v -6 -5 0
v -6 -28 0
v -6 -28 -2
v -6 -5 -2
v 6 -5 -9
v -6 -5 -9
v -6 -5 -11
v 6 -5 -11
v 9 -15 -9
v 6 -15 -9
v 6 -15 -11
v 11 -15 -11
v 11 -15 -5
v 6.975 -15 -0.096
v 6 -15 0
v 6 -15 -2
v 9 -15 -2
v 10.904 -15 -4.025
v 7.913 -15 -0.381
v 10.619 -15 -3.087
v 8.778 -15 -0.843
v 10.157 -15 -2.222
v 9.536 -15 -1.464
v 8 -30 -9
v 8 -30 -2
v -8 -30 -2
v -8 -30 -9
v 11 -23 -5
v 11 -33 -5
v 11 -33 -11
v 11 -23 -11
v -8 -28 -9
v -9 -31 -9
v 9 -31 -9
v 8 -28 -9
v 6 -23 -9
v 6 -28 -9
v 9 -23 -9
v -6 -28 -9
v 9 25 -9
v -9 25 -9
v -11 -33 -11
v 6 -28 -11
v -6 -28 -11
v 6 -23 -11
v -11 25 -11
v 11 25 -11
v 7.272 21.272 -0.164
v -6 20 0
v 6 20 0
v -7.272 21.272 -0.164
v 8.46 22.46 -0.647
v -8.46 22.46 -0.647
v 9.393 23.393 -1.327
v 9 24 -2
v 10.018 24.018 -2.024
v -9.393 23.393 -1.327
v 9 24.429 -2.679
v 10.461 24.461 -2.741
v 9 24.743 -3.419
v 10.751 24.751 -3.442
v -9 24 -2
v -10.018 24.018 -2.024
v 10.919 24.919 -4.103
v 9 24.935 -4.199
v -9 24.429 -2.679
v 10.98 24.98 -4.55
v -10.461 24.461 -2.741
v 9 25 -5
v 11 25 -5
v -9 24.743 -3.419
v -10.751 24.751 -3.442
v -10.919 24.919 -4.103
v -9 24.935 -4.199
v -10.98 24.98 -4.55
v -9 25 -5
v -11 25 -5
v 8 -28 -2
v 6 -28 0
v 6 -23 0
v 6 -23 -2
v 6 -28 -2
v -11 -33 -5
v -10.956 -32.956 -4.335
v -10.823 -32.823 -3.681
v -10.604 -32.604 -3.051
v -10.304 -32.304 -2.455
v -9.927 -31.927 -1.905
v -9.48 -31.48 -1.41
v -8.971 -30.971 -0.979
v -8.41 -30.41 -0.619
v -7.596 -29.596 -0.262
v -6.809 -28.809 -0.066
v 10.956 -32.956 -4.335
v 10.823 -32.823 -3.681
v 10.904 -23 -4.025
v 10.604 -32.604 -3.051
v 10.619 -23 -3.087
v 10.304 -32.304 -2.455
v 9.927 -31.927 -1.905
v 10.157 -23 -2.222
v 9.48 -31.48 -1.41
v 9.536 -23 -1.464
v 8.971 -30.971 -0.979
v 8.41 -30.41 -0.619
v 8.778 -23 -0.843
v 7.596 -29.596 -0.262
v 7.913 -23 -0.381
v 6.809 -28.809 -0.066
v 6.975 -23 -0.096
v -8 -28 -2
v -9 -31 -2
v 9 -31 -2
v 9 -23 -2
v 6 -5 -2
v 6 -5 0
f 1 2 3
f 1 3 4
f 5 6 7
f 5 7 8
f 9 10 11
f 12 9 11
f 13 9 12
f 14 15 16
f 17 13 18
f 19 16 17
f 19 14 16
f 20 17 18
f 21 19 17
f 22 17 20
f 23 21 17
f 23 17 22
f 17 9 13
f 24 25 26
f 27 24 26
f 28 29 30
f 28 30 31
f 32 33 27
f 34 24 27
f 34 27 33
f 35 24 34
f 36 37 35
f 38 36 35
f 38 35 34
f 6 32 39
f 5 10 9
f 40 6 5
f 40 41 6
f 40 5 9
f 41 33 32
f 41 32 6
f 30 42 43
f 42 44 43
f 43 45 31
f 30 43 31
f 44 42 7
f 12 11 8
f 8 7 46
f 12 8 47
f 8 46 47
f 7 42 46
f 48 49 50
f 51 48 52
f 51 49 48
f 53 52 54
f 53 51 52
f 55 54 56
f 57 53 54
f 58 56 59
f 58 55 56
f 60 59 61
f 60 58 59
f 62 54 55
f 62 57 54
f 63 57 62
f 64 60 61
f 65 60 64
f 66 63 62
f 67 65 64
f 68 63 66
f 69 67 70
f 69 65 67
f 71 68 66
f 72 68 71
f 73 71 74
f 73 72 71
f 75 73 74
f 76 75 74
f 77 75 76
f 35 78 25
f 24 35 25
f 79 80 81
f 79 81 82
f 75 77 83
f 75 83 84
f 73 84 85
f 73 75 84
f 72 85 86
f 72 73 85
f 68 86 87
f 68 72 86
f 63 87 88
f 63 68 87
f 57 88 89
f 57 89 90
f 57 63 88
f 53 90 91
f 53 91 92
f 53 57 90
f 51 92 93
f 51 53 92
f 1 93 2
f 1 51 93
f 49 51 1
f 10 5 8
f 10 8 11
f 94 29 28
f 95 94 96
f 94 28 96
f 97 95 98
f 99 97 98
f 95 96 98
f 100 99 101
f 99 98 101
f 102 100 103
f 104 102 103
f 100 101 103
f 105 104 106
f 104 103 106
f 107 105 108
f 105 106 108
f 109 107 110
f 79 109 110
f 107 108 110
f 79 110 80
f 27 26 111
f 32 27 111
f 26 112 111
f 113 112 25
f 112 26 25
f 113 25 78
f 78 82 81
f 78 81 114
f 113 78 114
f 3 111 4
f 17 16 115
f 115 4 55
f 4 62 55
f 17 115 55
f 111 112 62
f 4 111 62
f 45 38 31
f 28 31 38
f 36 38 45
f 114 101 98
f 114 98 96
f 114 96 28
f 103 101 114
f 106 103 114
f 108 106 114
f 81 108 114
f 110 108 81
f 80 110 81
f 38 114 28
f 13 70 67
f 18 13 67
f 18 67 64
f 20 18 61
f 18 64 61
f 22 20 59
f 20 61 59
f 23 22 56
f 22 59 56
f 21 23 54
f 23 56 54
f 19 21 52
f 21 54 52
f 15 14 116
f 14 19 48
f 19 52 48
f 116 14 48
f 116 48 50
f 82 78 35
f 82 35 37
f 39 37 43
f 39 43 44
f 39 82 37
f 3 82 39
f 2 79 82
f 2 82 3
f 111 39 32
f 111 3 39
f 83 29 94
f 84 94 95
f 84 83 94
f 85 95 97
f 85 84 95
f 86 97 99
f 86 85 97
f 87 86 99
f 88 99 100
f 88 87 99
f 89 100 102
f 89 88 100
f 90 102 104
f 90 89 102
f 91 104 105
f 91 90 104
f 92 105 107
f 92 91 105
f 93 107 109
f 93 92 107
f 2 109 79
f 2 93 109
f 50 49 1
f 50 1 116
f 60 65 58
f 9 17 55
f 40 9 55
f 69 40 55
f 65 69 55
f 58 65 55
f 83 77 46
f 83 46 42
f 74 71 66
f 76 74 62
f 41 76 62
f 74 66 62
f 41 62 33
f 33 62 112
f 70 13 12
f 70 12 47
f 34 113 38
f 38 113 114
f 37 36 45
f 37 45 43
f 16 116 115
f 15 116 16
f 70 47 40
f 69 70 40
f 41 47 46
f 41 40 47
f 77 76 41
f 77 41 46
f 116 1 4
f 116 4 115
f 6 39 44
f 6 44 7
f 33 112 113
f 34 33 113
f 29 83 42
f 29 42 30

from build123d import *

# Parameters (mm, degrees)
F1_DEPTH    = 11
F2_T        = -2
F3_DEPTH    = 25
F4_DEPTH    = 2
F5_DEPTH    = 2
F6_DEPTH    = 1
F7_T1_DEPTH = 65
F7_T3_DEPTH = 47
F7_T5_DEPTH = 83
F7_T7_DEPTH = 35


# Not quite as in the source:
# - a fillet or chamfer that OpenCascade refuses, or shapes differently, is made with other operations: its cross-section is extruded or revolved along the edge and cut away or added


with BuildPart() as f1:
    # F0 (on Top) → F1 (new body)
    with BuildSketch(Plane.XY):
        Polygon((11, -15), (11, 25), (-11, 25), (-11, -33), (11, -33), (11, -23), (6, -23), (6, -28), (-6, -28), (-6, -15), (-6, -5), (6, -5), (6, -15), align=None)
    extrude(amount=-F1_DEPTH)

    # F2
    f2_openings = [f1.faces().sort_by_distance(p)[0] for p in [
        (0, 25, -5.5),
    ]]
    offset(amount=F2_T, openings=f2_openings, kind=Kind.INTERSECTION)

    # F3 (cut): a face of the model
    f3_faces = [f1.faces().sort_by_distance(p)[0] for p in [
        (0, -3, -5.5),
    ]]
    extrude(f3_faces, amount=-F3_DEPTH, mode=Mode.SUBTRACT)

    # F4 (add): a face of the model
    f4_faces = [f1.faces().sort_by_distance(p)[0] for p in [
        (8, -14, -5.5),
    ]]
    extrude(f4_faces, amount=-F4_DEPTH)

    # F5 (add): a face of the model
    f5_faces = [f1.faces().sort_by_distance(p)[0] for p in [
        (8, -14, -5.5),
    ]]
    extrude(f5_faces, amount=-F5_DEPTH)

    # F6 (cut): faces of the model
    f6_faces = [f1.faces().sort_by_distance(p)[0] for p in [
        (8, -14, -5.5),
        (8, -24, -5.5),
    ]]
    extrude(f6_faces, amount=-F6_DEPTH, mode=Mode.SUBTRACT)

    # F7: fillet of radius 5 on 5 edges, made by hand

    # F7_s2 → F7_t1 (cut)
    with BuildSketch(Plane.XZ.offset(-37.5)):
        with BuildLine():
            ThreePointArc((11, -5), (9.5355339059, -1.4644660941), (6, 0))
            Line((6, 0), (11, 0))
            Line((11, 0), (11, -5))
        make_face()
    extrude(amount=F7_T1_DEPTH, mode=Mode.SUBTRACT)

    # F7_s4 → F7_t3 (cut)
    with BuildSketch(Plane.YZ.offset(-23.5)):
        with BuildLine():
            ThreePointArc((20, 0), (23.5355339059, -1.4644660941), (25, -5))
            Line((25, -5), (25, 0))
            Line((25, 0), (20, 0))
        make_face()
        with BuildLine():
            ThreePointArc((-33, -5), (-31.5355339059, -1.4644660941), (-28, 0))
            Line((-28, 0), (-33, 0))
            Line((-33, 0), (-33, -5))
        make_face()
    extrude(amount=F7_T3_DEPTH, mode=Mode.SUBTRACT)

    # F7_s6 → F7_t5 (cut)
    with BuildSketch(Plane.XZ.offset(-37.5)):
        with BuildLine():
            ThreePointArc((-11, -5), (-9.5355339059, -1.4644660941), (-6, 0))
            Line((-6, 0), (-11, 0))
            Line((-11, 0), (-11, -5))
        make_face()
    extrude(amount=F7_T5_DEPTH, mode=Mode.SUBTRACT)

    # F7_s8 → F7_t7 (cut)
    with BuildSketch(Plane.XZ.offset(10.5)):
        with BuildLine():
            ThreePointArc((11, -5), (9.5355339059, -1.4644660941), (6, 0))
            Line((6, 0), (11, 0))
            Line((11, 0), (11, -5))
        make_face()
    extrude(amount=F7_T7_DEPTH, mode=Mode.SUBTRACT)


solid = f1.part
